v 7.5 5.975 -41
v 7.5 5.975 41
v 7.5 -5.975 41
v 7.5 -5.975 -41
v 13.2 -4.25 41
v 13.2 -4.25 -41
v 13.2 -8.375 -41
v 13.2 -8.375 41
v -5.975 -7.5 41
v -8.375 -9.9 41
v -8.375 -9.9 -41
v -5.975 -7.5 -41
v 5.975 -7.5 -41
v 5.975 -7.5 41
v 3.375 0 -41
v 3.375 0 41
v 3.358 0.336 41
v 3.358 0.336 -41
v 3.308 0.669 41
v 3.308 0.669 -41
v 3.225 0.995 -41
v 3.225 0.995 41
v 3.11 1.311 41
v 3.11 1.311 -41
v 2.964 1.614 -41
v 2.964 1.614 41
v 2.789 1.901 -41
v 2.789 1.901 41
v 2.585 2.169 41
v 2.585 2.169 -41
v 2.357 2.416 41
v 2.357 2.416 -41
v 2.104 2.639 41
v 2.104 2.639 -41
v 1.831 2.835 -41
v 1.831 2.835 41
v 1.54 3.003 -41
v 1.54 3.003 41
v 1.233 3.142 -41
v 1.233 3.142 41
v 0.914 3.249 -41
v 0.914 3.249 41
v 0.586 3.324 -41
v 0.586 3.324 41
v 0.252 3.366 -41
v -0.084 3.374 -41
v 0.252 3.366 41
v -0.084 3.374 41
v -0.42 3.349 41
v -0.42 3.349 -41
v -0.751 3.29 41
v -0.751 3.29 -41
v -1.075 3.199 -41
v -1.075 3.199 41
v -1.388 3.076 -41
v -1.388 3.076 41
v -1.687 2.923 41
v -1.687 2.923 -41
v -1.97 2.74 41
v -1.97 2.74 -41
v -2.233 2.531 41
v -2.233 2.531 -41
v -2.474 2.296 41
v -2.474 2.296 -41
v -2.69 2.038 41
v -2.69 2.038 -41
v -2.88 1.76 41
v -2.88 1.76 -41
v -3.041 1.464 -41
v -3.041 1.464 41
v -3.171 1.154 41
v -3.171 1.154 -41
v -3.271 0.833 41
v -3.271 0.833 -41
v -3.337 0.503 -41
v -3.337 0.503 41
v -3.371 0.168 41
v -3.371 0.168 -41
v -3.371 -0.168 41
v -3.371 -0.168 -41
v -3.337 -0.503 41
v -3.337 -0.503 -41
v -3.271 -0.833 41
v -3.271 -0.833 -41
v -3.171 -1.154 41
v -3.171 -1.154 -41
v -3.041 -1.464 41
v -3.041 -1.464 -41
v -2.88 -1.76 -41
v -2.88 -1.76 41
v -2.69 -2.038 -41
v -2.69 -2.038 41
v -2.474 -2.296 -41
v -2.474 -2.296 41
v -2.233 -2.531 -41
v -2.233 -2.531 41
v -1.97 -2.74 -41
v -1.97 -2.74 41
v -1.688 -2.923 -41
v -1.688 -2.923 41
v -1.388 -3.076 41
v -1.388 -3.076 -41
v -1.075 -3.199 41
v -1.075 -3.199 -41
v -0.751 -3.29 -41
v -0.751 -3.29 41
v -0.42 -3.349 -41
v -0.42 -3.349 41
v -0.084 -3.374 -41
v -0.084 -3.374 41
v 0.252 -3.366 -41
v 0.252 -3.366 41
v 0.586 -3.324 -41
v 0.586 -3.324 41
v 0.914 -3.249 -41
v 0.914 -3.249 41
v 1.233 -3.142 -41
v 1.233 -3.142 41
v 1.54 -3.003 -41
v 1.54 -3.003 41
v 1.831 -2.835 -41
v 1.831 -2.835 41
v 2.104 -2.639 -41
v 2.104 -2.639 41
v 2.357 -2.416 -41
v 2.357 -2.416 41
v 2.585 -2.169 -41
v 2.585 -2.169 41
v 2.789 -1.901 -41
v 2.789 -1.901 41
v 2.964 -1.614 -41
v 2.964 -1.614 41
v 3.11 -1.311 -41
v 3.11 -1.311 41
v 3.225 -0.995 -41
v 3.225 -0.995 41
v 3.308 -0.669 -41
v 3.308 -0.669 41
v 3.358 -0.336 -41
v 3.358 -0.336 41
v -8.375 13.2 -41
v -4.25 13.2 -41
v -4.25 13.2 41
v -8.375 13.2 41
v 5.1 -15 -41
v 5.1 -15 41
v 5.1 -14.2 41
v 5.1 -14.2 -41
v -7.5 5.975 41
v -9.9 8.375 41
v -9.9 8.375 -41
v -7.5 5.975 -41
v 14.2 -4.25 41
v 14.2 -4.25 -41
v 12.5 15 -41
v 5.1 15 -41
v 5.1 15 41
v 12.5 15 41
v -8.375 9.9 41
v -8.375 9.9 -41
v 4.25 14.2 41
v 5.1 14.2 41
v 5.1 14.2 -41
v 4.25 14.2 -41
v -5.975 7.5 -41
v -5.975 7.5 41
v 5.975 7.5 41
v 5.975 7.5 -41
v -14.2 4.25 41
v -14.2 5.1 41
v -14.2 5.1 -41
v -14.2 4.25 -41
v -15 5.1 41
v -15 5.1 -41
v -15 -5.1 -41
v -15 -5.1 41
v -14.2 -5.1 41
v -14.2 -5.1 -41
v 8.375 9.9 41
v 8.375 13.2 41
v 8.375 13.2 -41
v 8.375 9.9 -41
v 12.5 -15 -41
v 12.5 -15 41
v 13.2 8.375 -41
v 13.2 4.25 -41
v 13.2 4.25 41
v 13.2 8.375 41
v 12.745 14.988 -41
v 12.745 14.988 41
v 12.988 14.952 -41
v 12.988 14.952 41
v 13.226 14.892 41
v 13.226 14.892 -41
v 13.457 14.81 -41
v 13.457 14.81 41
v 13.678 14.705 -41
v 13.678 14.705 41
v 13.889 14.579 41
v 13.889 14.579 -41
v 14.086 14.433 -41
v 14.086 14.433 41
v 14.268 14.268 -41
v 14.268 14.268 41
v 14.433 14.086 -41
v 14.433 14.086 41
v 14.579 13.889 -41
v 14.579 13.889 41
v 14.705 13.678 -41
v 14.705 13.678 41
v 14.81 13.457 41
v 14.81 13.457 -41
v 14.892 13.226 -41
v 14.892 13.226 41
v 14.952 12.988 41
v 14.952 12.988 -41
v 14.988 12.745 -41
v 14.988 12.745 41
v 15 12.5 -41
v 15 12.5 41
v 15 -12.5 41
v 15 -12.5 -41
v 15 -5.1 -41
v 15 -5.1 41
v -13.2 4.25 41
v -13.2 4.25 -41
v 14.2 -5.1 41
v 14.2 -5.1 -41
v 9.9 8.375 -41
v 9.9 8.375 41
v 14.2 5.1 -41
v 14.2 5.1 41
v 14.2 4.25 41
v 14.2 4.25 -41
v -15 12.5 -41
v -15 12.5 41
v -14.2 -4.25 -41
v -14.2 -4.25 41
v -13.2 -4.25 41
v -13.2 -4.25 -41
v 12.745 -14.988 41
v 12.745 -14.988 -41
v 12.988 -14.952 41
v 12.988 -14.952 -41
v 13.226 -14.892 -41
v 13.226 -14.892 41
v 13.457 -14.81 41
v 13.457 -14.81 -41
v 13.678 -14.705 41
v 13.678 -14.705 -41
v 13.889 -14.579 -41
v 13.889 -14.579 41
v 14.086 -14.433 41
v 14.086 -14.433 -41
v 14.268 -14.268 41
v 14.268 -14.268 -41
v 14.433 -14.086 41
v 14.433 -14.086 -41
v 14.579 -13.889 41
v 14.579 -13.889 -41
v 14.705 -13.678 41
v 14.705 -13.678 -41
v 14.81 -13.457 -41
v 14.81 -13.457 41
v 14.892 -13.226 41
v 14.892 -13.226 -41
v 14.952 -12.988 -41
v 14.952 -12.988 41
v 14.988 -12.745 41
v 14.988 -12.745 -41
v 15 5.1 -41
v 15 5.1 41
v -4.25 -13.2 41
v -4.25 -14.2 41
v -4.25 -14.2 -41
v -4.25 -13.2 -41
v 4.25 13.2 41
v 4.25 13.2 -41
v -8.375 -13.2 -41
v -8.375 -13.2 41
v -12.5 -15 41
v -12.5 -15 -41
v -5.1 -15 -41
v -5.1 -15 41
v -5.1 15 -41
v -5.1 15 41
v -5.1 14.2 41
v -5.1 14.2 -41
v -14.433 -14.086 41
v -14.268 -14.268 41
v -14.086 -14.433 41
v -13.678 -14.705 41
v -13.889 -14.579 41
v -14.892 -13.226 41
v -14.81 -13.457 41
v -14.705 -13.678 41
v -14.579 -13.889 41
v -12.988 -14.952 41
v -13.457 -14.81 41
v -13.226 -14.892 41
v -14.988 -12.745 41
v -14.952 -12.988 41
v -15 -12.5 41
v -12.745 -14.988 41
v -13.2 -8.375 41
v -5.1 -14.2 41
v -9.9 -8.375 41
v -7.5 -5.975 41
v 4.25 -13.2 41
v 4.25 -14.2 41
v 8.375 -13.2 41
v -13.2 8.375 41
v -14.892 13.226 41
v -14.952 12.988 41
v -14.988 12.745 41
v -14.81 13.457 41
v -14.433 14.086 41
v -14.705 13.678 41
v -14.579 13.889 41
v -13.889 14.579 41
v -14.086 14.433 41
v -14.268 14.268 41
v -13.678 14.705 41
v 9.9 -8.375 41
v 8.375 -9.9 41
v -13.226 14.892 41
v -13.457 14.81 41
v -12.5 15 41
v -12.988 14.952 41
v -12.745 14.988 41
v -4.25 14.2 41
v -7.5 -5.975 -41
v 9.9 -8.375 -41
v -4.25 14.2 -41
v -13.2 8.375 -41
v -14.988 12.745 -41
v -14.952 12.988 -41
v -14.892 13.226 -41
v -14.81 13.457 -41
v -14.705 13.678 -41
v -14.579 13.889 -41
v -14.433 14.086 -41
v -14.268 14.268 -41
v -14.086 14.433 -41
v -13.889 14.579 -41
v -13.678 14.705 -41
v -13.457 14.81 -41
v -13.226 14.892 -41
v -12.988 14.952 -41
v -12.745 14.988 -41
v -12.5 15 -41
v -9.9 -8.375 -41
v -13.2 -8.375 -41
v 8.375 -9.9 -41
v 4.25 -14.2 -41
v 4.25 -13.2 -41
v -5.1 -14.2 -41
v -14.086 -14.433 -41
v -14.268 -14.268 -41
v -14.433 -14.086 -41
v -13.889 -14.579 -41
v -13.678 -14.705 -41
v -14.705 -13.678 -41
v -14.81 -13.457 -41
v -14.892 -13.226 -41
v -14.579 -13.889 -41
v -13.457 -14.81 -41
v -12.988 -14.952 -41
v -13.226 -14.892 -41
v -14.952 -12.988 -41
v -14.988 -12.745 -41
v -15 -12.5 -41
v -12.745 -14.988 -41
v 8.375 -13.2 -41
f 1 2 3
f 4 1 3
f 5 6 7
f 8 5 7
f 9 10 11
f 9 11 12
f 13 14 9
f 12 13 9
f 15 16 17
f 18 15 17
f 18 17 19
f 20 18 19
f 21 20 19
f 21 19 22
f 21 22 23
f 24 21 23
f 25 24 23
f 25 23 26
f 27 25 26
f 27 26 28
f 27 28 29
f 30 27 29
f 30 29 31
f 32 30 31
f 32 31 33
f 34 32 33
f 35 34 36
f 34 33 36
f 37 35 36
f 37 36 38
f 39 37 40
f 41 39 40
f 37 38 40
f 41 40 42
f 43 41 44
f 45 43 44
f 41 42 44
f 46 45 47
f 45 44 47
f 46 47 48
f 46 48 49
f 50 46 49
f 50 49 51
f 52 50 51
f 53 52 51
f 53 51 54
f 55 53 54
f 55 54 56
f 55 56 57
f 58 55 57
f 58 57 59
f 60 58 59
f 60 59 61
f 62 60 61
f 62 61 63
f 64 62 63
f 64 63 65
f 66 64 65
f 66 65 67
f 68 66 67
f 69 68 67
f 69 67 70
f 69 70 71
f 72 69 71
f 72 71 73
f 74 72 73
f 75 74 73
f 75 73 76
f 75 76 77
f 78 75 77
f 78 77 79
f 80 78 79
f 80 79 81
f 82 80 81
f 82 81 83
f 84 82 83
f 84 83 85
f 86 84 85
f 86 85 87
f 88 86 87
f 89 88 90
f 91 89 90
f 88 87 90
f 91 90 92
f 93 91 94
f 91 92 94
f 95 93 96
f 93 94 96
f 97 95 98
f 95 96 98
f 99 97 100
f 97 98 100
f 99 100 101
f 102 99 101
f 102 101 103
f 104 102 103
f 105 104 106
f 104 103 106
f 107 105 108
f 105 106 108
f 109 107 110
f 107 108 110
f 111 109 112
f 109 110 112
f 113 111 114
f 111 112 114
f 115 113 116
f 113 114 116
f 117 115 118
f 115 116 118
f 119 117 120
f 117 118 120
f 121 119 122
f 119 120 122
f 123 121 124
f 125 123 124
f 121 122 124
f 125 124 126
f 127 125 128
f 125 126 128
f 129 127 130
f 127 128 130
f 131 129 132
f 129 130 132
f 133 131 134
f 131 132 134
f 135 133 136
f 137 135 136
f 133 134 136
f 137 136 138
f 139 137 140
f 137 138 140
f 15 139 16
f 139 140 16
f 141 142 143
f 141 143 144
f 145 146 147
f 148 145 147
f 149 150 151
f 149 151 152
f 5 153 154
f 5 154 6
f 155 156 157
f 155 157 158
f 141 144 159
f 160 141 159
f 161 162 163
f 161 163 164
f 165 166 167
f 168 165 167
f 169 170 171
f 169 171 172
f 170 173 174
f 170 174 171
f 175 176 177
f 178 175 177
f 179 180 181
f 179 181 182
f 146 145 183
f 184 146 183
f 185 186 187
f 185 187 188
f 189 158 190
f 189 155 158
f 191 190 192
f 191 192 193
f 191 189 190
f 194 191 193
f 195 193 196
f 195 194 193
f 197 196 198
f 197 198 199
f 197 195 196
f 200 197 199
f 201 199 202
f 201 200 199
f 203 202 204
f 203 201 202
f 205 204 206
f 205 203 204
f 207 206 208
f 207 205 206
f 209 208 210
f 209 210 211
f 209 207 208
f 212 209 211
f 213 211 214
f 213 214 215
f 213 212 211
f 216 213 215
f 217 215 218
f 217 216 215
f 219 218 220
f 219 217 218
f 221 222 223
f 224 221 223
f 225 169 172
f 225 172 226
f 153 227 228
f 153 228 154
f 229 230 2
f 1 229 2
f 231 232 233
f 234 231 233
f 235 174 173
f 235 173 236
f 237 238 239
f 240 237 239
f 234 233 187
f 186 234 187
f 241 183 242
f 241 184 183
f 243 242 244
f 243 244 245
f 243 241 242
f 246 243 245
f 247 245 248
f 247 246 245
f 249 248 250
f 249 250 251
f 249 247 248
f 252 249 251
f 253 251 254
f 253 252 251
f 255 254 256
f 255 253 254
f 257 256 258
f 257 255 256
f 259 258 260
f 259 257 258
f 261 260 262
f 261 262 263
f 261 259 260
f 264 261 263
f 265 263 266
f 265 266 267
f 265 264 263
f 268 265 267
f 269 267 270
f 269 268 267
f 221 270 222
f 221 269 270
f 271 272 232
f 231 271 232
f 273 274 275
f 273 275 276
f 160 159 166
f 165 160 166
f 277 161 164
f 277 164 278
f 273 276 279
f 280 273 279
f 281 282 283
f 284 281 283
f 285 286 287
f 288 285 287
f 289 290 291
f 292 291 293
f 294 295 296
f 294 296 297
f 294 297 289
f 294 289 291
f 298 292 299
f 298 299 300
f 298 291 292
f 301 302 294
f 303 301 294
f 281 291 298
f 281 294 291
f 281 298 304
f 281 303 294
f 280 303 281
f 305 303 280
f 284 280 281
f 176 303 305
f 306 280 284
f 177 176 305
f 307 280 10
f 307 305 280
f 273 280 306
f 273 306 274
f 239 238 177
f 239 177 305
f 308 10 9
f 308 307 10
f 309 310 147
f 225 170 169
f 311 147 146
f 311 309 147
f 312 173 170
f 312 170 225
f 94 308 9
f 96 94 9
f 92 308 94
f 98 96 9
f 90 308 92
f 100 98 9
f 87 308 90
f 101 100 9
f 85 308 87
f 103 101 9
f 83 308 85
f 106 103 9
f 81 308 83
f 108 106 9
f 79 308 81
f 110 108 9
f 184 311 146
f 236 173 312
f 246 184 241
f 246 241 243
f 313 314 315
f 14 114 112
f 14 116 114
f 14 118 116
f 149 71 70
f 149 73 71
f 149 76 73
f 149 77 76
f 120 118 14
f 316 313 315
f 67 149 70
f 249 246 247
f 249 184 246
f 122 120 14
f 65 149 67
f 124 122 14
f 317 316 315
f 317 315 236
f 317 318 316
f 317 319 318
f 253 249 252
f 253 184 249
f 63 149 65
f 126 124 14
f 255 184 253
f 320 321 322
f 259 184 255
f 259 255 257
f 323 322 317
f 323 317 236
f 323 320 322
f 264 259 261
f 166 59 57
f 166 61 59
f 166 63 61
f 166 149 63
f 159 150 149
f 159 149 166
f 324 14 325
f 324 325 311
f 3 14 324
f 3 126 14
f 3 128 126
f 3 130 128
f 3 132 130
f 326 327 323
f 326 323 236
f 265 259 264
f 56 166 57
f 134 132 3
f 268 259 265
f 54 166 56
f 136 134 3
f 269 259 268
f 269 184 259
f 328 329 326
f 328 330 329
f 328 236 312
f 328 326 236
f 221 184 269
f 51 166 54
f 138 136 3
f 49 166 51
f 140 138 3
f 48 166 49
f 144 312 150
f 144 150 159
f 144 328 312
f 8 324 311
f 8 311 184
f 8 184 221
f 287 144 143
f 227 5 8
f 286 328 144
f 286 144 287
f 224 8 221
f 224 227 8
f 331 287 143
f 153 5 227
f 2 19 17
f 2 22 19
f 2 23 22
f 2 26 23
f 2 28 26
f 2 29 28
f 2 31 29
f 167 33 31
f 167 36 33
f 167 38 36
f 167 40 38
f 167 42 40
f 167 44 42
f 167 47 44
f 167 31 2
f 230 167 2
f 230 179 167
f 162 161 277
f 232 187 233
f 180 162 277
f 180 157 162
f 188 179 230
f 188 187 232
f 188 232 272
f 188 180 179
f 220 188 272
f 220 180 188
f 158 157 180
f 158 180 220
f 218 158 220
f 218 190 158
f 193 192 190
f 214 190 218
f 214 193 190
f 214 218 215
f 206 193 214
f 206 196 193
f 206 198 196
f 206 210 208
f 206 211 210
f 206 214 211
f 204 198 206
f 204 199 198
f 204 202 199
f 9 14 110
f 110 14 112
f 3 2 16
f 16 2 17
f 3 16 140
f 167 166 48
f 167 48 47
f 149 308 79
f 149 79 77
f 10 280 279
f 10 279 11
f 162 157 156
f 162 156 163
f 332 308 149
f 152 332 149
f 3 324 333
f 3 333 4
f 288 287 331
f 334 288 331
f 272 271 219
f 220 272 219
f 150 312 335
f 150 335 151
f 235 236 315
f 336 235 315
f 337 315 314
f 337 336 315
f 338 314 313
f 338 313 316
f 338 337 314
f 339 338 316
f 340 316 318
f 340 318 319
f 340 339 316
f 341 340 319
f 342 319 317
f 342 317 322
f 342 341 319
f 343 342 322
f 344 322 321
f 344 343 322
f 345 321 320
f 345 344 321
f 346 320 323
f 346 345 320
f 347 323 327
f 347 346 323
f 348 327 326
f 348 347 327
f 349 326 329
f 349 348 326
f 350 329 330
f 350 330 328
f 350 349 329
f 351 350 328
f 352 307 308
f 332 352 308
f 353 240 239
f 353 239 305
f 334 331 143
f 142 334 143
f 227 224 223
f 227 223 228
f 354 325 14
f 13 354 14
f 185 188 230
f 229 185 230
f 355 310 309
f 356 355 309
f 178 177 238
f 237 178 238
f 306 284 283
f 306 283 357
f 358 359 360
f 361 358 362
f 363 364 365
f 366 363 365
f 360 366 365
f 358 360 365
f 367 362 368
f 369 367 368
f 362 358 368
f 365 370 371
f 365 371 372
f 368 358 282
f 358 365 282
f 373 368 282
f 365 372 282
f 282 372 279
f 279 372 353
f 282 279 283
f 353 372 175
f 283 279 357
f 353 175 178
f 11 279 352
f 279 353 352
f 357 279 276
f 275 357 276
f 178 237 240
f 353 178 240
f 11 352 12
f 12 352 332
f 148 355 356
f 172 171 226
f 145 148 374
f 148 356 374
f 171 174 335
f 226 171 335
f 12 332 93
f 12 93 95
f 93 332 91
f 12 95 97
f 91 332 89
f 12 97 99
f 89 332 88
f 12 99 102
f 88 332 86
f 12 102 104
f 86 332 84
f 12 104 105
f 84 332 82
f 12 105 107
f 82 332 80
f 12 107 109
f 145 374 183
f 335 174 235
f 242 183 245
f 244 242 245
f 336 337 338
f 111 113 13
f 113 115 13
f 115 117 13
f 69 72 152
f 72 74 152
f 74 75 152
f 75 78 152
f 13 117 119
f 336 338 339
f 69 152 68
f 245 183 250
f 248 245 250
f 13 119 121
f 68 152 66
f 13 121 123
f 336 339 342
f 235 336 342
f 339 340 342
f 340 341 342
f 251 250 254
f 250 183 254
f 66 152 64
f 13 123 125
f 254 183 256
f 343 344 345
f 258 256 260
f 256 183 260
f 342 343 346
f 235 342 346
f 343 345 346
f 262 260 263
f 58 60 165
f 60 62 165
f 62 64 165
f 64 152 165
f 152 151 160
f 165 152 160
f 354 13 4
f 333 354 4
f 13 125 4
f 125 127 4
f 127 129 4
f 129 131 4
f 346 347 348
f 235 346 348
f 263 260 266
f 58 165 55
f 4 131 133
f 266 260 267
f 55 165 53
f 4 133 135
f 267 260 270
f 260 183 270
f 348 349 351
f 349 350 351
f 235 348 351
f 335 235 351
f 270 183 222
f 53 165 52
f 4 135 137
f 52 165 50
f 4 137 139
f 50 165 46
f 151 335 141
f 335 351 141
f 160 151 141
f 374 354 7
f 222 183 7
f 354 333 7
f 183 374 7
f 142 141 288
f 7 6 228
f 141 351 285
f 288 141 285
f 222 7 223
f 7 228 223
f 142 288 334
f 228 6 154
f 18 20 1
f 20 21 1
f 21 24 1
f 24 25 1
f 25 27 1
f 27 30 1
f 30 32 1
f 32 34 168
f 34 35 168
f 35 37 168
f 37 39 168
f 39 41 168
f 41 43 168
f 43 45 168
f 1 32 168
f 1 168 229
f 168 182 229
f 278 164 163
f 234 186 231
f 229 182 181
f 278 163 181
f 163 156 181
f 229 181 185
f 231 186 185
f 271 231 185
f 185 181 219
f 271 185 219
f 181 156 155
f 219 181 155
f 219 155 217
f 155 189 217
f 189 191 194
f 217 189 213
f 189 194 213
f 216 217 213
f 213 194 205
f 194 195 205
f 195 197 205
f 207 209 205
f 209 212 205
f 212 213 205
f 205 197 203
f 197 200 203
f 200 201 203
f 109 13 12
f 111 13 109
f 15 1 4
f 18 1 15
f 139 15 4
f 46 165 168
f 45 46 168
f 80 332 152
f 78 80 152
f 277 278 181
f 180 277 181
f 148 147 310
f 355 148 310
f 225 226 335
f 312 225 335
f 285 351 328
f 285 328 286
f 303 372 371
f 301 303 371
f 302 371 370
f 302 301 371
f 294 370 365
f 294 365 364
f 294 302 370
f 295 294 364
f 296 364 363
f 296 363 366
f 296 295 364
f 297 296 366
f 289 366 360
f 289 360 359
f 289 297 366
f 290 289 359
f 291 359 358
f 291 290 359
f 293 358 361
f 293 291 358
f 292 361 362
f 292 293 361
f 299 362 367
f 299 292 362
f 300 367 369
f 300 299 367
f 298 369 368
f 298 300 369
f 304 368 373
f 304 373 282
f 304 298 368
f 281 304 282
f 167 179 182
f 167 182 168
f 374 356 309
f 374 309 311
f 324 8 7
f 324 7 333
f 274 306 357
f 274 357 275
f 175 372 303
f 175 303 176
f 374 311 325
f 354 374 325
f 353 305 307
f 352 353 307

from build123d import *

# Parameters (mm, degrees)
SKETCH1_W                = 30
SKETCH1_H                = 30
BOSS_EXTRUDE1_DEPTH      = 41
SKETCH2_R                = 3.375
CUT_EXTRUDE1_DEPTH       = 83
FILLET1_R                = 2.5
CUT_EXTRUDE2_DEPTH       = 83
CIRPATTERN1_COUNT        = 4
CIRPATTERN1_COPY_1_DEPTH = 83
CIRPATTERN1_COPY_2_DEPTH = 83
CIRPATTERN1_COPY_3_DEPTH = 83


with BuildPart() as part:
    # Sketch1 → Boss-Extrude1 (new body, symmetric)
    with BuildSketch(Plane.XY):
        Rectangle(SKETCH1_W, SKETCH1_H)
    extrude(amount=BOSS_EXTRUDE1_DEPTH, both=True)

    # Sketch2 → Cut-Extrude1 (cut, through all)
    with BuildSketch(Plane.XY.offset(41)):
        Circle(SKETCH2_R)
    extrude(amount=-CUT_EXTRUDE1_DEPTH, mode=Mode.SUBTRACT)

    # Fillet1
    fillet1_edges = [part.edges().sort_by_distance(p)[0] for p in [
        (15, -15, 0),
        (-15, -15, 0),
        (-15, 15, 0),
        (15, 15, 0),
    ]]
    fillet(fillet1_edges, radius=FILLET1_R)

    # Sketch3 → Cut-Extrude2 (cut, through all)
    with BuildSketch(Plane.XY.offset(41)):
        Polygon((0, 15), (-5.1, 15), (-5.1, 14.2), (-4.25, 14.2), (-4.25, 13.2), (-8.375, 13.2), (-8.375, 9.9), (-5.975, 7.5), (0, 7.5), align=None)
    cut_extrude2 = extrude(amount=-CUT_EXTRUDE2_DEPTH, mode=Mode.SUBTRACT)

    # Mirror1: Cut-Extrude2 across plane
    add(cut_extrude2.mirror(Plane(origin=(0, 0, 0), x_dir=(0, 0, 1), z_dir=(1, 0, 0))), mode=Mode.SUBTRACT)

    # CirPattern1: Cut-Extrude2 ×4 about axis
    cirpattern1_axis = Axis((0, 0, 0), (0, 0, 1))
    for i in range(1, CIRPATTERN1_COUNT):
        add(cut_extrude2.rotate(cirpattern1_axis, i * 360 / CIRPATTERN1_COUNT), mode=Mode.SUBTRACT)

    # CirPattern1 copy 1 sketch → CirPattern1 copy 1 (cut, through all)
    with BuildSketch(Plane(origin=(0, 0, 41), x_dir=(0, -1, 0), z_dir=(0, 0, 1))):
        Polygon((0, -15), (-5.1, -15), (-5.1, -14.2), (-4.25, -14.2), (-4.25, -13.2), (-8.375, -13.2), (-8.375, -9.9), (-5.975, -7.5), (0, -7.5), align=None)
    extrude(amount=-CIRPATTERN1_COPY_1_DEPTH, mode=Mode.SUBTRACT)

    # CirPattern1 copy 2 sketch → CirPattern1 copy 2 (cut, through all)
    with BuildSketch(Plane.XY.offset(41)):
        Polygon((0, -15), (-5.1, -15), (-5.1, -14.2), (-4.25, -14.2), (-4.25, -13.2), (-8.375, -13.2), (-8.375, -9.9), (-5.975, -7.5), (0, -7.5), align=None)
    extrude(amount=-CIRPATTERN1_COPY_2_DEPTH, mode=Mode.SUBTRACT)

    # CirPattern1 copy 3 sketch → CirPattern1 copy 3 (cut, through all)
    with BuildSketch(Plane(origin=(0, 0, 41), x_dir=(0, 1, 0), z_dir=(0, 0, 1))):
        Polygon((0, -15), (-5.1, -15), (-5.1, -14.2), (-4.25, -14.2), (-4.25, -13.2), (-8.375, -13.2), (-8.375, -9.9), (-5.975, -7.5), (0, -7.5), align=None)
    extrude(amount=-CIRPATTERN1_COPY_3_DEPTH, mode=Mode.SUBTRACT)


solid = part.part
